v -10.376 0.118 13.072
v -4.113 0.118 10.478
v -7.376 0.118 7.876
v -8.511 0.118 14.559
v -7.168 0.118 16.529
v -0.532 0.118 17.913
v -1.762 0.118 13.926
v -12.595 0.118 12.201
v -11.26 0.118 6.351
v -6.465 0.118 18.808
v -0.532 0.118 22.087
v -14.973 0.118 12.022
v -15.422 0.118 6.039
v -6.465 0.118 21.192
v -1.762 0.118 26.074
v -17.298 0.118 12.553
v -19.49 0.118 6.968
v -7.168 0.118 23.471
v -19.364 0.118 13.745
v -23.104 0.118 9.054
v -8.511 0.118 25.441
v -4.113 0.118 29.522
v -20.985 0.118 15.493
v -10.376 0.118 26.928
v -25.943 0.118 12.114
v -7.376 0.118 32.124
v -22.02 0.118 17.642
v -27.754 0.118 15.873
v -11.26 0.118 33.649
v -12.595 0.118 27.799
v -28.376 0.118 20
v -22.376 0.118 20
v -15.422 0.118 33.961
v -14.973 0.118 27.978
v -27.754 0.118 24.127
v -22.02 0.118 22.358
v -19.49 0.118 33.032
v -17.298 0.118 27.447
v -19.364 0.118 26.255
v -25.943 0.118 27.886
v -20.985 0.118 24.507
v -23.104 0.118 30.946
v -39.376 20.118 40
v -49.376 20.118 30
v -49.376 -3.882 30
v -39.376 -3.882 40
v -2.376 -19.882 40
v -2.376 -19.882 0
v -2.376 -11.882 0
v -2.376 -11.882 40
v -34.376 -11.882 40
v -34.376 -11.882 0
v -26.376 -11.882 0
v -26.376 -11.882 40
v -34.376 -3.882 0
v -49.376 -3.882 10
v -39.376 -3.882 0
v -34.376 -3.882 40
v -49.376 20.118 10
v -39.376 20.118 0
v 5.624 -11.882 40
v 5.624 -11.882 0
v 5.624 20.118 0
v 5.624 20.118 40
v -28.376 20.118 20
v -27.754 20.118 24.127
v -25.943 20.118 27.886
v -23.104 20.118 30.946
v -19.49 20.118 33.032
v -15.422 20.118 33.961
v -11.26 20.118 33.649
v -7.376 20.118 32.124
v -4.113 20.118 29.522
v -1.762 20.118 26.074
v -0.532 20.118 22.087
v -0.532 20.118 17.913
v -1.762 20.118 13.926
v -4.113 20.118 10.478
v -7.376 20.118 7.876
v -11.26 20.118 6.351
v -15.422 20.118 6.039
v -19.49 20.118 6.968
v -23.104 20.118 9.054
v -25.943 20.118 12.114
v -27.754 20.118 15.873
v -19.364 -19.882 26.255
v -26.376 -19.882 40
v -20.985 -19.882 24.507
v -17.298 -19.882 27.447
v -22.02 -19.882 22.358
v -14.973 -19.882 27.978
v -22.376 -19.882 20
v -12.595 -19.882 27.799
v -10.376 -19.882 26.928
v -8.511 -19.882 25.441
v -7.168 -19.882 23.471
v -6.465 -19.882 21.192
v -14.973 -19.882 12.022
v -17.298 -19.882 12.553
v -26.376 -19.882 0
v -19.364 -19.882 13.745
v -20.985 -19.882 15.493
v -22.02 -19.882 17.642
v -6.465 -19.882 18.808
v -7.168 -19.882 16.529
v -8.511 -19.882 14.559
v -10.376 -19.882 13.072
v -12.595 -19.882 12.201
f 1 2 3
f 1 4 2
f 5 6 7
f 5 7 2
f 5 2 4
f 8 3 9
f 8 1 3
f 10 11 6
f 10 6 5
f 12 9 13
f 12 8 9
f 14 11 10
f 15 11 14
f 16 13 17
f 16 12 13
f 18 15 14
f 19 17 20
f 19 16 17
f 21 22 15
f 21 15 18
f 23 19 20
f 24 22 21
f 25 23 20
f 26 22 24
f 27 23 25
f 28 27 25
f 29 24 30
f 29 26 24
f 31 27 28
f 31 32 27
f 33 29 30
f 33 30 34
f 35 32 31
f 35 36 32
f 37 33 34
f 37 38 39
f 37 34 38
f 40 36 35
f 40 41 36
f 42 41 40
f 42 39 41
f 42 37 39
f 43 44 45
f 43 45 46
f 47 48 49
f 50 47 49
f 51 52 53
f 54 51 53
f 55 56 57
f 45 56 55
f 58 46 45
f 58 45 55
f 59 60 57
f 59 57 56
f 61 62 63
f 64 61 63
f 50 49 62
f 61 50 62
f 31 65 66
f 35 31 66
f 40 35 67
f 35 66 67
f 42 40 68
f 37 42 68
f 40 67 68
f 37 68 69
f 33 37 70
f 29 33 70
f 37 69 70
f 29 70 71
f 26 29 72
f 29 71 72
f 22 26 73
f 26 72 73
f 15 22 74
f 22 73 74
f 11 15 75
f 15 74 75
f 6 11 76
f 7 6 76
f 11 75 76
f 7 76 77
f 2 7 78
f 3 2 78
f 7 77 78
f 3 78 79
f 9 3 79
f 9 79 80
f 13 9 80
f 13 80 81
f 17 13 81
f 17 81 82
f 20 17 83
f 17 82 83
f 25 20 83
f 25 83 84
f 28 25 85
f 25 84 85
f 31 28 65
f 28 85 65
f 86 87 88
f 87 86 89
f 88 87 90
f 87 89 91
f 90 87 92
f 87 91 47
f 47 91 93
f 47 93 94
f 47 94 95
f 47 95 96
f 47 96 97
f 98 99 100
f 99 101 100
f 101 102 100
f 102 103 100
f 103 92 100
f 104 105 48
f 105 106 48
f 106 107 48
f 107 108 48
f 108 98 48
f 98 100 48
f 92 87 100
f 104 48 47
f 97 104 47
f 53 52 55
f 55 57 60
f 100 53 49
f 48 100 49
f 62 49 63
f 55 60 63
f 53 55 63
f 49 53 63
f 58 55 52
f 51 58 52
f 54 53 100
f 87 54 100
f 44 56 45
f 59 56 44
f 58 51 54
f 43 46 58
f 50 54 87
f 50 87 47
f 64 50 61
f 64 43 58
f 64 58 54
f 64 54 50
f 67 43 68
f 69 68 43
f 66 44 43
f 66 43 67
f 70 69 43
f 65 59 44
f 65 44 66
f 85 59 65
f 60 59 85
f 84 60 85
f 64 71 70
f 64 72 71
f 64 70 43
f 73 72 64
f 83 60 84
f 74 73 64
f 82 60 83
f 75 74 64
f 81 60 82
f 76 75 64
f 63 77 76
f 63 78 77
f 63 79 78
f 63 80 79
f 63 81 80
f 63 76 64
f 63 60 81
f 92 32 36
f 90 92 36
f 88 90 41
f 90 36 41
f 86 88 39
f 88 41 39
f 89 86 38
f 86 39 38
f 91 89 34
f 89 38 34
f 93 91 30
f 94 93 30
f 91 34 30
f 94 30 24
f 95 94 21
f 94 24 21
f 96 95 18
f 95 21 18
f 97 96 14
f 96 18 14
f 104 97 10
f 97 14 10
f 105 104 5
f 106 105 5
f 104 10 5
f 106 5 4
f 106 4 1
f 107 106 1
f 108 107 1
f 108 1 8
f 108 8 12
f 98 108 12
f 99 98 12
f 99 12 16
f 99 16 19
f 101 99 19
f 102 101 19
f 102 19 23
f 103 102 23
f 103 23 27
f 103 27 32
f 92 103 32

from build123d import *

# Parameters (mm, degrees)
ESQUISSE1_W             = 55
ESQUISSE1_H             = 40
EXTRUSION1_DEPTH        = 40
ESQUISSE2_W             = 8
ESQUISSE2_H             = 8
ENL_V_MAT_EXTRU_1_DEPTH = 41
ENL_V_MAT_EXTRU_2_DEPTH = 40
ENL_V_MAT_EXTRU_3_DEPTH = 40
ENL_V_MAT_EXTRU_4_DEPTH = 40
ESQUISSE6_R             = 8
ENL_V_MAT_EXTRU_5_DEPTH = 41
ESQUISSE7_R             = 14
ENL_V_MAT_EXTRU_6_DEPTH = 20


with BuildPart() as part:
    # Esquisse1 → Extrusion1 (new body)
    with BuildSketch(Plane.XY):
        with Locations((-21.875589067, 0.118096136)):
            Rectangle(ESQUISSE1_W, ESQUISSE1_H)
    extrude(amount=EXTRUSION1_DEPTH)

    # Esquisse2 → Enlèv. mat.-Extru.1 (cut, through all)
    with BuildSketch(Plane.XY.offset(40)):
        with Locations((1.624410933, -15.881903864)):
            Rectangle(ESQUISSE2_W, ESQUISSE2_H)
    extrude(amount=-ENL_V_MAT_EXTRU_1_DEPTH, mode=Mode.SUBTRACT)

    # Esquisse3 → Enlèv. mat.-Extru.2 (cut)
    with BuildSketch(Plane.XY.offset(40)):
        Polygon((-49.375589067, -3.881903864), (-34.375589067, -3.881903864), (-34.375589067, -11.881903864), (-26.375589067, -11.881903864), (-26.375589067, -19.881903864), (-49.375589067, -19.881903864), align=None)
    extrude(amount=-ENL_V_MAT_EXTRU_2_DEPTH, mode=Mode.SUBTRACT)

    # Esquisse4 → Enlèv. mat.-Extru.3 (cut)
    with BuildSketch(Plane(origin=(0, 20.118096136, 0), x_dir=(-1, 0, 0), z_dir=(0, 1, 0))):
        Polygon((49.375589067, 0), (39.375589067, 0), (49.375589067, 10), align=None)
    extrude(amount=-ENL_V_MAT_EXTRU_3_DEPTH, mode=Mode.SUBTRACT)

    # Esquisse5 → Enlèv. mat.-Extru.4 (cut)
    with BuildSketch(Plane(origin=(0, 20.118096136, 0), x_dir=(-1, 0, 0), z_dir=(0, 1, 0))):
        Polygon((49.375589067, 30), (39.375589067, 40), (49.375589067, 40), align=None)
    extrude(amount=-ENL_V_MAT_EXTRU_4_DEPTH, mode=Mode.SUBTRACT)

    # Esquisse6 → Enlèv. mat.-Extru.5 (cut, through all)
    with BuildSketch(Plane(origin=(0, 20.118096136, 0), x_dir=(-1, 0, 0), z_dir=(0, 1, 0))):
        with Locations((14.375589067, 20)):
            Circle(ESQUISSE6_R)
    extrude(amount=-ENL_V_MAT_EXTRU_5_DEPTH, mode=Mode.SUBTRACT)

    # Esquisse7 → Enlèv. mat.-Extru.6 (cut)
    with BuildSketch(Plane(origin=(0, 20.118096136, 0), x_dir=(-1, 0, 0), z_dir=(0, 1, 0))):
        with Locations((14.375589067, 20)):
            Circle(ESQUISSE7_R)
    extrude(amount=-ENL_V_MAT_EXTRU_6_DEPTH, mode=Mode.SUBTRACT)


solid = part.part
